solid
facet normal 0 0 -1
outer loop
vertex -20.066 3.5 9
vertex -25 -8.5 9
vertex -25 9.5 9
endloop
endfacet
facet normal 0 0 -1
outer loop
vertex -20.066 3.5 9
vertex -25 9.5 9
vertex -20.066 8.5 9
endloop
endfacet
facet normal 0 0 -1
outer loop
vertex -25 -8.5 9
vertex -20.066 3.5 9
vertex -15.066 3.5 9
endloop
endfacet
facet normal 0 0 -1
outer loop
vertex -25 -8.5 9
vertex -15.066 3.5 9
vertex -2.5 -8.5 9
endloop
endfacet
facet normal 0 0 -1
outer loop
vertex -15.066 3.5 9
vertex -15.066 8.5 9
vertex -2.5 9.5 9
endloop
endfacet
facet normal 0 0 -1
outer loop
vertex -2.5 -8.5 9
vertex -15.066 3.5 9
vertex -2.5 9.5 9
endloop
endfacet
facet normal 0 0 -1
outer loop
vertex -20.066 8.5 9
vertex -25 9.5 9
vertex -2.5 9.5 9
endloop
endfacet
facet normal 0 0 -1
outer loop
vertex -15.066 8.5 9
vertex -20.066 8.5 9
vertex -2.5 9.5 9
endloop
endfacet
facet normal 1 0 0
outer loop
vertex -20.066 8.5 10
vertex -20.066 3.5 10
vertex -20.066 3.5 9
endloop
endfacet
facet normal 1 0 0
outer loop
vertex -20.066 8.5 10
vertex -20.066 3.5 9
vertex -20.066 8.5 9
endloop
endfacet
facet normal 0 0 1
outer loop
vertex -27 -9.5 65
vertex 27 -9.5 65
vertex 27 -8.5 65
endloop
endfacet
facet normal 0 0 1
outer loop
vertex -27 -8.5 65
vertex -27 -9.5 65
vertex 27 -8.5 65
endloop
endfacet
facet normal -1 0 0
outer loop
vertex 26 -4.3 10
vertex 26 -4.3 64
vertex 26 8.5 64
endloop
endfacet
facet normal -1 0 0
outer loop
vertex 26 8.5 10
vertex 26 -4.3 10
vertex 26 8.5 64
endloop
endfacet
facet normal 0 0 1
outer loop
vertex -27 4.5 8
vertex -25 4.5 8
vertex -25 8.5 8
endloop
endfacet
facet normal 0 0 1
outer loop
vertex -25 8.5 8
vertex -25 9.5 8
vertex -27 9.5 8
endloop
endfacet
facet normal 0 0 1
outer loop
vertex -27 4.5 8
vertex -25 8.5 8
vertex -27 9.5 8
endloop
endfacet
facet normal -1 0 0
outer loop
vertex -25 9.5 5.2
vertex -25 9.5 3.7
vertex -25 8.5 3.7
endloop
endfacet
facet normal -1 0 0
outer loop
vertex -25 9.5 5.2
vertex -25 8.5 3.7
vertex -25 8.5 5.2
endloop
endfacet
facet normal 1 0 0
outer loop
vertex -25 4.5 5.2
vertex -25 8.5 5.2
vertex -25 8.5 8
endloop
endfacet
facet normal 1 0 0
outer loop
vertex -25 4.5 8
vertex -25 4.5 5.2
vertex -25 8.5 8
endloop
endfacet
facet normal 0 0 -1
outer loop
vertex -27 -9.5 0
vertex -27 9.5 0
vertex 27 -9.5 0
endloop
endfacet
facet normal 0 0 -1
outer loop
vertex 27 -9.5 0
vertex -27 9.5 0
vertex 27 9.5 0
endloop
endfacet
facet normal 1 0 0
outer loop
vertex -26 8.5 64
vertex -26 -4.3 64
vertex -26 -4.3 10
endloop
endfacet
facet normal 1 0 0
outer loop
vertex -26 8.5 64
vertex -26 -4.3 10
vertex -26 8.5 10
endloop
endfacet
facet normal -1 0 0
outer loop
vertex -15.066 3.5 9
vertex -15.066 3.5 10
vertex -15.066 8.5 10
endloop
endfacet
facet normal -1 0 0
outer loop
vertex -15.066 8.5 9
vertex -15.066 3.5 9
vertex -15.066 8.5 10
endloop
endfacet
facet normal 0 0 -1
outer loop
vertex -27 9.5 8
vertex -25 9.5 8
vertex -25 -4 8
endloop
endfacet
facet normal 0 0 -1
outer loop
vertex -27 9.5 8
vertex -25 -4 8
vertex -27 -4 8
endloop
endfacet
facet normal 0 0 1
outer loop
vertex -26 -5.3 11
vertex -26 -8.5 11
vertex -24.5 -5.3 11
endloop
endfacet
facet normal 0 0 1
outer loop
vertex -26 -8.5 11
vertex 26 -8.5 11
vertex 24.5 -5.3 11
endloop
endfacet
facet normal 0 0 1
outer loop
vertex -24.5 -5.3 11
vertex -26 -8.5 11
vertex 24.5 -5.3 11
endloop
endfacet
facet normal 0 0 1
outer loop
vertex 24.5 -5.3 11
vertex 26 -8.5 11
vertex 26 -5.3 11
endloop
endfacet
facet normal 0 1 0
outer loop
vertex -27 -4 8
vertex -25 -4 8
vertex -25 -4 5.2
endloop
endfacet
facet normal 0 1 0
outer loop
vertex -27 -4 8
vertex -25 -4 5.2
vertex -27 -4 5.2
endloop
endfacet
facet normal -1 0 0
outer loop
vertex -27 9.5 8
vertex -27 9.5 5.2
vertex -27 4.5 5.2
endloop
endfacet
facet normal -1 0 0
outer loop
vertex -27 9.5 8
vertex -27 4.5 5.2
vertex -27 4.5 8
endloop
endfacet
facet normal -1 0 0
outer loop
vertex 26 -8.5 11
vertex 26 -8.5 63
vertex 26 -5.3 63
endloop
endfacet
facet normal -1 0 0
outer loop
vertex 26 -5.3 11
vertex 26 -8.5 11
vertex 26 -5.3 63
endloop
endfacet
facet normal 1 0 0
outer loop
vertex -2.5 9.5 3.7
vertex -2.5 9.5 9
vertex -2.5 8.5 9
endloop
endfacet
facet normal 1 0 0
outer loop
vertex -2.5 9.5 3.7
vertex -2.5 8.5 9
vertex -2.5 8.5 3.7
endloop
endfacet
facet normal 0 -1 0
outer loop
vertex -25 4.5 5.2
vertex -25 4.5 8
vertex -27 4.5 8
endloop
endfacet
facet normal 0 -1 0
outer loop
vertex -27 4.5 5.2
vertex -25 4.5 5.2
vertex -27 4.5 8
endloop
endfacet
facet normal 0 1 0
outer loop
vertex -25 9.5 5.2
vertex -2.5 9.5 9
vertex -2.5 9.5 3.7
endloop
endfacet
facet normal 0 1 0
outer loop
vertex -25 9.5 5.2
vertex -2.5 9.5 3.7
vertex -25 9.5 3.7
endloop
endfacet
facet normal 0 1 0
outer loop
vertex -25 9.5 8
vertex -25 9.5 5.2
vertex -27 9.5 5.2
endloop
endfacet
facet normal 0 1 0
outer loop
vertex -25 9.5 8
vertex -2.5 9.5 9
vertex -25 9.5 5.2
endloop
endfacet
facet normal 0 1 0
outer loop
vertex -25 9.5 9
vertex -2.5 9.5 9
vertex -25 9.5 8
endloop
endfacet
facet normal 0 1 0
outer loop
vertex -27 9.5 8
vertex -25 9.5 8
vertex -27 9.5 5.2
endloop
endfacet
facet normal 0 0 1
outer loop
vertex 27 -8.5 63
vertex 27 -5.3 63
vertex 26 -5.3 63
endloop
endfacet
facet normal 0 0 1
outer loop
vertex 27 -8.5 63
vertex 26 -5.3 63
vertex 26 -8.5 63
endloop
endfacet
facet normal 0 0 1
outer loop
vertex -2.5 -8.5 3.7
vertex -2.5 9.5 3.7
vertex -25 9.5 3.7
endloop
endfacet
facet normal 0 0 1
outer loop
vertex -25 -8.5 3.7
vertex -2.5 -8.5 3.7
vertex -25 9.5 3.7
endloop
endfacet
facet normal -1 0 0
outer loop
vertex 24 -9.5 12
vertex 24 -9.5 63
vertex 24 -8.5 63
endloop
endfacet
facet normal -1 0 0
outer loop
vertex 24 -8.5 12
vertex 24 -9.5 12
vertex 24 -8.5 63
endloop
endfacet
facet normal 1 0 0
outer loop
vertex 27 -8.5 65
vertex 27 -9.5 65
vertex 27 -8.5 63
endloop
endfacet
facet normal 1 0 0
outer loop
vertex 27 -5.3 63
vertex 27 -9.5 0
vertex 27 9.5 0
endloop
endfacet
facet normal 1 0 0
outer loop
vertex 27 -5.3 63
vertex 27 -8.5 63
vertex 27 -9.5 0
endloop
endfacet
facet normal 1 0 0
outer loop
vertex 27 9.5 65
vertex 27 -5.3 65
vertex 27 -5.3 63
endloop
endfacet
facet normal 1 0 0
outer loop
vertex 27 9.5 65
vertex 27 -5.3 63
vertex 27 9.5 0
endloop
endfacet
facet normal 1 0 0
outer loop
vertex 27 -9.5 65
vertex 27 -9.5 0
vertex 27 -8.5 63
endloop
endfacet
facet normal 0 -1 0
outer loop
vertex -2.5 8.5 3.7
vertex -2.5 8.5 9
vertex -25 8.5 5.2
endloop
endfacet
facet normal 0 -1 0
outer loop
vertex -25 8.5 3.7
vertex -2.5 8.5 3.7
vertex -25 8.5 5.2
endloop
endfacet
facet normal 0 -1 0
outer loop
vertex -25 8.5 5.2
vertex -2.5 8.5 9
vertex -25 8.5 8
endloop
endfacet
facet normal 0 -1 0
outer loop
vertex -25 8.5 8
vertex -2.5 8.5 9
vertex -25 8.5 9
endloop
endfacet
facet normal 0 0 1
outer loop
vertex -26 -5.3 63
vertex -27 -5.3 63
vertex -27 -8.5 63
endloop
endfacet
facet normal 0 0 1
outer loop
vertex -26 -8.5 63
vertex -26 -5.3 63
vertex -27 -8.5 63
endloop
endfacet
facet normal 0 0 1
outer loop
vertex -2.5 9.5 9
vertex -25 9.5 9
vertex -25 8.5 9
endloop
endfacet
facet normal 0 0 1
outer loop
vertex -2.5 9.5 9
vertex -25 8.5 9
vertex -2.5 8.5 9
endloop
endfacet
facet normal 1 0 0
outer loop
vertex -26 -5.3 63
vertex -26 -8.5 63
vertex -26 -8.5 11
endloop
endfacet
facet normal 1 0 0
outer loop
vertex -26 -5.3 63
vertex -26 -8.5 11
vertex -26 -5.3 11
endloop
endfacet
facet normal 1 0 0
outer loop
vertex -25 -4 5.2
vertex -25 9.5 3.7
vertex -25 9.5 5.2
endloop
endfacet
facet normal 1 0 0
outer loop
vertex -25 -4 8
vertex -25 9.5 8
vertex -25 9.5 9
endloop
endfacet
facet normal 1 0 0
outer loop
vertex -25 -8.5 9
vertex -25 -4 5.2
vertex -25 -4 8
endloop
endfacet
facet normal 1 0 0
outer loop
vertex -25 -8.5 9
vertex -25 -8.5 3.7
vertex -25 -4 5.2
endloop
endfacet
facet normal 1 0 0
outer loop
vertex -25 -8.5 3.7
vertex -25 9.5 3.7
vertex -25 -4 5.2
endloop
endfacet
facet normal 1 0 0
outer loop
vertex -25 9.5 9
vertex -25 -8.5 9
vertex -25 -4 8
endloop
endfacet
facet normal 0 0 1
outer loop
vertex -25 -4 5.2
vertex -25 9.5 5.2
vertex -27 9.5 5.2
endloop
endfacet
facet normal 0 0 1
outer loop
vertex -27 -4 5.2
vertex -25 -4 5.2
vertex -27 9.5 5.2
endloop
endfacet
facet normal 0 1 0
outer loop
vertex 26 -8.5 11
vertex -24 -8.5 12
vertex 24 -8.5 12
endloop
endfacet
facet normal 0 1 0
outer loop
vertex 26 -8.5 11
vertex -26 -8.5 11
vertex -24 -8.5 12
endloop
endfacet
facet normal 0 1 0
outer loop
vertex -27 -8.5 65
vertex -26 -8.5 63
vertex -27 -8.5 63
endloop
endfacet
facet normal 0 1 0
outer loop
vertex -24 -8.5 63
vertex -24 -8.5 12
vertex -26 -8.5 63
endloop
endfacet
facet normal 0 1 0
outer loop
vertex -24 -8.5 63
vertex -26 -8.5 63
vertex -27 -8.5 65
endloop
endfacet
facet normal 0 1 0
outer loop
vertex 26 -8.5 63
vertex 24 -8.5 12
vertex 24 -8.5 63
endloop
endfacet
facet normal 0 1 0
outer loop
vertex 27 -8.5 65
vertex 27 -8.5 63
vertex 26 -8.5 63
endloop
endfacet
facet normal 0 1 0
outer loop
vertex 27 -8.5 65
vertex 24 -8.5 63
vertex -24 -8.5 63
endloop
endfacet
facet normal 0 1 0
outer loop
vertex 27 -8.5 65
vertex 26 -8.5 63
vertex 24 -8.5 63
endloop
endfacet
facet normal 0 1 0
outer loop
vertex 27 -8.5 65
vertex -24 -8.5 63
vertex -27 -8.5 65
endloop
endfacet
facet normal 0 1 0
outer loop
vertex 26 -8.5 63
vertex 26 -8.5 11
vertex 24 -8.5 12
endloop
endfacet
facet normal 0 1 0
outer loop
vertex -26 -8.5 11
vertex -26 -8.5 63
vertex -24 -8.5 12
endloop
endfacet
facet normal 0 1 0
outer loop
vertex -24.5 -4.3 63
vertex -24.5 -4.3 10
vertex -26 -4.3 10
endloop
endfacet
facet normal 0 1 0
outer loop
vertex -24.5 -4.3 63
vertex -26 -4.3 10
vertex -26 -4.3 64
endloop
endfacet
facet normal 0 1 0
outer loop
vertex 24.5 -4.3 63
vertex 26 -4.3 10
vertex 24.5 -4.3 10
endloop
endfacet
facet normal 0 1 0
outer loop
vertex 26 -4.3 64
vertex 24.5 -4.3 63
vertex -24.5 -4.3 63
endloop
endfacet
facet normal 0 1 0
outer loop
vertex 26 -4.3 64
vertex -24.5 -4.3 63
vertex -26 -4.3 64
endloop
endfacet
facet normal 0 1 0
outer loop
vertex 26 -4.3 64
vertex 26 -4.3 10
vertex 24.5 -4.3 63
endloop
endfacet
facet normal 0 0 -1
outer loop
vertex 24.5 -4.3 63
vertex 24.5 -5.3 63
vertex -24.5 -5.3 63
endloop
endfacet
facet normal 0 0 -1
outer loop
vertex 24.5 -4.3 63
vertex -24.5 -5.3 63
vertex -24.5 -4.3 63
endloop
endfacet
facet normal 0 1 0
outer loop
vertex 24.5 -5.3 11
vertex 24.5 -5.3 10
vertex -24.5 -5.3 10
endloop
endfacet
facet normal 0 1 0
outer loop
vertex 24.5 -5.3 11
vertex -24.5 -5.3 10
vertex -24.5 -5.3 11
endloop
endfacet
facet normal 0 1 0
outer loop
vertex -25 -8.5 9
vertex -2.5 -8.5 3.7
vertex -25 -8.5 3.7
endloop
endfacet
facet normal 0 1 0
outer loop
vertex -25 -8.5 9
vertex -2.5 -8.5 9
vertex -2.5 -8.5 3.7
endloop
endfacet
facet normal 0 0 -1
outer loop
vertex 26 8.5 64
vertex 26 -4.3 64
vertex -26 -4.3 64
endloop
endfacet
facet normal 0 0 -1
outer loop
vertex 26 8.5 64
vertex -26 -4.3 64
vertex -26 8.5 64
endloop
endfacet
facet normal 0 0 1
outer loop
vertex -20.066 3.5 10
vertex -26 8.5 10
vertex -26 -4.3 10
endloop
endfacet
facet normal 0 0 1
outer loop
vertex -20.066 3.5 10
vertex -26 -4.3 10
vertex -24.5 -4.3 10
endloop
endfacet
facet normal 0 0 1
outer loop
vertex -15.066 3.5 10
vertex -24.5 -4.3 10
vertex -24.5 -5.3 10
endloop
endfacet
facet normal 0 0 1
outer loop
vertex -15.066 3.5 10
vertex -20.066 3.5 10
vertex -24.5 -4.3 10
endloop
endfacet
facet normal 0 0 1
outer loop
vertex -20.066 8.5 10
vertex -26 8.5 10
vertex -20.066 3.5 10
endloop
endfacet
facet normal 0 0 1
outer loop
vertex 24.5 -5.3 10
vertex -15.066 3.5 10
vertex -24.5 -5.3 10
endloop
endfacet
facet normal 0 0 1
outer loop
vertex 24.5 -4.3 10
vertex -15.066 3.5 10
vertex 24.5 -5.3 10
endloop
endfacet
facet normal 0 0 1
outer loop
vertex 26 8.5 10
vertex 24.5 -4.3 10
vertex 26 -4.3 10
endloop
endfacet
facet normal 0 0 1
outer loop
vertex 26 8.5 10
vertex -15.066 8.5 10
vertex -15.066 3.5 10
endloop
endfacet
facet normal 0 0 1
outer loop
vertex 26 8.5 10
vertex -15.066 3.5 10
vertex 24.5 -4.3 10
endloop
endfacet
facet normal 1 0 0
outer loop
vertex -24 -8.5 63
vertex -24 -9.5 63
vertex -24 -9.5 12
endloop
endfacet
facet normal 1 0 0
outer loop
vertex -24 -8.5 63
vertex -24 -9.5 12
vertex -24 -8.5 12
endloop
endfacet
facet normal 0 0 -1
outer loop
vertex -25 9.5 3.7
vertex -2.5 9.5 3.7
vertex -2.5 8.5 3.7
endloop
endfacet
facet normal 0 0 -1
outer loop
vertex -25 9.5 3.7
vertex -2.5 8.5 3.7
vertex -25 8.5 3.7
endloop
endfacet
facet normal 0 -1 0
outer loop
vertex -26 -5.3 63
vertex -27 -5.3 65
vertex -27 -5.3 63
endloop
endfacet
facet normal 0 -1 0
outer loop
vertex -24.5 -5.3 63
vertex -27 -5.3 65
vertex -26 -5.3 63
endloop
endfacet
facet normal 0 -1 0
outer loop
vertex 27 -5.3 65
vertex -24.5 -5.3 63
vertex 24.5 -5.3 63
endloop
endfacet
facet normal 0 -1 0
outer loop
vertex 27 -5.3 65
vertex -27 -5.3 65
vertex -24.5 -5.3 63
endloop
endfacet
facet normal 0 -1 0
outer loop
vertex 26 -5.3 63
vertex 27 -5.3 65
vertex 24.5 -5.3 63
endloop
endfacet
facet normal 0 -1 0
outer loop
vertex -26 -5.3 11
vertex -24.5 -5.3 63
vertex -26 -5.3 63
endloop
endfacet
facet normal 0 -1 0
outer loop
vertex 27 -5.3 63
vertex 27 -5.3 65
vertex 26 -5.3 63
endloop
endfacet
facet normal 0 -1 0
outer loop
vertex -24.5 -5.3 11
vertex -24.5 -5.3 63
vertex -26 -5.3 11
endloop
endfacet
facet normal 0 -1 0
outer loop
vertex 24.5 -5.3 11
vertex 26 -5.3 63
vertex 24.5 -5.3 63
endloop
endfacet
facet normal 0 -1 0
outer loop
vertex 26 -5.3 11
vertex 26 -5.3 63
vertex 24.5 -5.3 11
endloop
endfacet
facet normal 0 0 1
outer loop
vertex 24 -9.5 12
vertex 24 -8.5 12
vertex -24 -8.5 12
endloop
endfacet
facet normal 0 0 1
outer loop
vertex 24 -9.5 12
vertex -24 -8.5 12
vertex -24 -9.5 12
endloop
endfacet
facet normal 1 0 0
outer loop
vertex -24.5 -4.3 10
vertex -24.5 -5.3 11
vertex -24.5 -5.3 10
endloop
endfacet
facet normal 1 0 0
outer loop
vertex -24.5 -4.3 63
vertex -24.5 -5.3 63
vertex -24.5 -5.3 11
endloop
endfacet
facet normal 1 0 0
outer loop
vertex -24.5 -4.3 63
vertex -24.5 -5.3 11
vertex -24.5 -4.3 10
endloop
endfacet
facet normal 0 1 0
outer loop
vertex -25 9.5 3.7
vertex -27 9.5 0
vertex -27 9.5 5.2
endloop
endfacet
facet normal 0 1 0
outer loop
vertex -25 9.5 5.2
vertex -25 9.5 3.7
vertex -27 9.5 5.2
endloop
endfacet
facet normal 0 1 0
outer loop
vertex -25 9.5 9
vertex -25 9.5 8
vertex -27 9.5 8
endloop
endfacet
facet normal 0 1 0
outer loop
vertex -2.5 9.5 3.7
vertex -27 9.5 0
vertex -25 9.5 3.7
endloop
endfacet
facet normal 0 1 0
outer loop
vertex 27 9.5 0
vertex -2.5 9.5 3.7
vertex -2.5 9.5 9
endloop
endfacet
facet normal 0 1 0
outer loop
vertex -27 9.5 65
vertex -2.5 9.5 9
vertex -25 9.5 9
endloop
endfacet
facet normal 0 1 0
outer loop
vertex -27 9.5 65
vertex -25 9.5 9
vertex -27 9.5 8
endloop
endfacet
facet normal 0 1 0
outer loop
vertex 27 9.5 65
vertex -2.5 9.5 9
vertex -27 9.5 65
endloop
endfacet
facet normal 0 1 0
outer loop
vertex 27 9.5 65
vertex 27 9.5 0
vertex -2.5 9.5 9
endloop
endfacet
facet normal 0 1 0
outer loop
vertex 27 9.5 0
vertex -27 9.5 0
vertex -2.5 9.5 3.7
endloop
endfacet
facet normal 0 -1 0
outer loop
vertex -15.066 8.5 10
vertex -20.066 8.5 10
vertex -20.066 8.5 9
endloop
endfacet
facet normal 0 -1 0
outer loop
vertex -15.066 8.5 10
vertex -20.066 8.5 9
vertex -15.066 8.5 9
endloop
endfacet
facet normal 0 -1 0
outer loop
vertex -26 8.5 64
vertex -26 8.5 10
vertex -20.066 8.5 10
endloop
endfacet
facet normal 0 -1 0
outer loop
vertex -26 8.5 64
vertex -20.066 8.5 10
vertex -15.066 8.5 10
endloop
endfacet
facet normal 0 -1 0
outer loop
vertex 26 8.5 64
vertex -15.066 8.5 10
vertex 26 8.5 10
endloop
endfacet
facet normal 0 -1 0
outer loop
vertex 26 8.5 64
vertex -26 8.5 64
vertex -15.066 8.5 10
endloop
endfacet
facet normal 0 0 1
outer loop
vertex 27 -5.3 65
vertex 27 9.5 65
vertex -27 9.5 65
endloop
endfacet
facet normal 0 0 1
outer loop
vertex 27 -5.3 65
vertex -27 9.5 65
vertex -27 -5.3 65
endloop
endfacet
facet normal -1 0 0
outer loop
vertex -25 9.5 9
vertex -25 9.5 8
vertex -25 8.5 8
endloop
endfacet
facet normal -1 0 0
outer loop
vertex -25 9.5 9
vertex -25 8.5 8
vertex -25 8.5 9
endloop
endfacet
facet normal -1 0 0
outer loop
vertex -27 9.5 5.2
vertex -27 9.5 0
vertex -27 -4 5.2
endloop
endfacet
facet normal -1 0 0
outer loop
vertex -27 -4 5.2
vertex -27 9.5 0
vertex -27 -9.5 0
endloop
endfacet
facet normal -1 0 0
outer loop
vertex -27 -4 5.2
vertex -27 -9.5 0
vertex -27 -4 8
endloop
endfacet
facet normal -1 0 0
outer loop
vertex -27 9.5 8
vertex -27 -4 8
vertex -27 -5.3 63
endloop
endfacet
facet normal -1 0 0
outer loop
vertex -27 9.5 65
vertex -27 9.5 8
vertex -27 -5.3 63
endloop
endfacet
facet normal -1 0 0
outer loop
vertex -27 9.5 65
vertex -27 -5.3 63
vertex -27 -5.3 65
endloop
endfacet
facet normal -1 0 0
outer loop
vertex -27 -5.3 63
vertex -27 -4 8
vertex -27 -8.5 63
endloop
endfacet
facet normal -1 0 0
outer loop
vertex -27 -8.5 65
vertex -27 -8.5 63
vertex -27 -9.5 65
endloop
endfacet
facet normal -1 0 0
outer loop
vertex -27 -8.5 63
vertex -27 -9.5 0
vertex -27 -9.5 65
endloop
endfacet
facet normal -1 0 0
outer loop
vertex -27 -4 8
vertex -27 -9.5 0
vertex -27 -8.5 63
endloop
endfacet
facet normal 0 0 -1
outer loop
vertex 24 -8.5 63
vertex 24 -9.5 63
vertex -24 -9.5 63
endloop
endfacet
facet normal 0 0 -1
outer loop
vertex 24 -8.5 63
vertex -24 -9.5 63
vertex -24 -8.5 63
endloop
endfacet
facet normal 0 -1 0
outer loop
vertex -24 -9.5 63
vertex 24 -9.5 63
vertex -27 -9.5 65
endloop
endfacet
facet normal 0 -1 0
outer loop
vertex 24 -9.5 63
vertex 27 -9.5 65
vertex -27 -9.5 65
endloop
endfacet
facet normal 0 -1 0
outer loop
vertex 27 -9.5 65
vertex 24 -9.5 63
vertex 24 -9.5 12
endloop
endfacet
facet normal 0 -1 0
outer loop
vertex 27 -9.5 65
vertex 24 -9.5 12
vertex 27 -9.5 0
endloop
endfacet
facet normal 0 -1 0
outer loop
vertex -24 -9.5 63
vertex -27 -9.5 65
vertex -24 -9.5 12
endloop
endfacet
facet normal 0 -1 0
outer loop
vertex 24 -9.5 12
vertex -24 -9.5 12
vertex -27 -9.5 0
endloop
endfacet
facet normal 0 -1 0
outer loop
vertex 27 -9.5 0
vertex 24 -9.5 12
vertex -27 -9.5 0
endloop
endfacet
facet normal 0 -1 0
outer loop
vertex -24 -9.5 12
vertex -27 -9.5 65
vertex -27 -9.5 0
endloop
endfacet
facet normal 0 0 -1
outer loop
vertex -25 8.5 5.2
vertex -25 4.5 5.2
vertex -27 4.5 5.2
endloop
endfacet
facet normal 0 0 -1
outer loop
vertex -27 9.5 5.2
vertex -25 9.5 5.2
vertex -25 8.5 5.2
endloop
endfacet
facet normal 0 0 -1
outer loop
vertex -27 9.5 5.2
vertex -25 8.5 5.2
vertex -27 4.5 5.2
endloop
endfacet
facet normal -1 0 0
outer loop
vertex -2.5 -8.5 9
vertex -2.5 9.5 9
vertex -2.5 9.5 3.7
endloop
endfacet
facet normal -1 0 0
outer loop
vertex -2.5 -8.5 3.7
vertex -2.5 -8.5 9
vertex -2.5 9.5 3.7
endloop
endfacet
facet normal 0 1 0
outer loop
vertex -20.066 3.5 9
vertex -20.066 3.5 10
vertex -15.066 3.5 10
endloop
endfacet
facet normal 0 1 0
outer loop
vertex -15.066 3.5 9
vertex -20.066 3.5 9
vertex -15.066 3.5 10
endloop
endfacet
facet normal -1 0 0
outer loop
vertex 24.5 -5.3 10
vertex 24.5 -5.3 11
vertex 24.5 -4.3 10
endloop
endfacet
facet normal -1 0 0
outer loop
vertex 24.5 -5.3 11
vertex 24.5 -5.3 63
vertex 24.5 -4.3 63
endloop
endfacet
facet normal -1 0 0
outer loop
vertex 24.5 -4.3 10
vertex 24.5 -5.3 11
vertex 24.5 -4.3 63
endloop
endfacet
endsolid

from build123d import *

# Parameters (mm, degrees)
F0_W      = 54
F0_H      = 19
F1_DEPTH  = 10
F2_W      = 1
F2_H      = 51
F3_DEPTH  = 3
F2_H_2    = 1
F4_DEPTH  = 1
F2_H_3    = 54
F5_DEPTH  = 54
F2_W_2    = 3.2
F6_DEPTH  = 1
F2_H_4    = 2
F7_DEPTH  = 54
F8_DEPTH  = 2.5
F10_W     = 2
F10_H     = 2.8
F11_DEPTH = 18
F12_W     = 2
F12_H     = 2.8
F13_DEPTH = 4.5
F14_DEPTH = 1
F15_DEPTH = 5
F16_W     = 5
F16_H     = 5
F17_DEPTH = 1


# Not quite as in the source:
# - a feature names something its author has since deleted; it is built from what else it names


with BuildPart() as f1:
    # F0 (on Top) → F1 (new body)
    with BuildSketch(Plane.XY):
        Rectangle(F0_W, F0_H)
    extrude(amount=F1_DEPTH)

    # F2 (on face) → F3 (join)
    with BuildSketch(Plane.YZ.offset(27)):
        with Locations((-9, 37.5)):
            Rectangle(F2_W, F2_H)
        Polygon((-9.5, 12), (-9.5, 10), (-8.5, 10), (-8.5, 11), (-8.5, 12), align=None)
    extrude(amount=-F3_DEPTH)

    # F2 (on face) → F4 (join)
    with BuildSketch(Plane.YZ.offset(27)):
        Polygon((-5.3, 11), (-5.3, 10), (-4.3, 10), (-4.3, 63), (-5.3, 63), align=None)
        Polygon((-4.3, 63), (-4.3, 10), (8.5, 10), (8.5, 64), (-4.3, 64), align=None)
        with Locations((-4.8, 63.5)):
            Rectangle(F2_W, F2_H_2)
    extrude(amount=-F4_DEPTH)

    # F2 (on face) → F5 (join, through all)
    with BuildSketch(Plane.YZ.offset(27)):
        with Locations((9, 37)):
            Rectangle(F2_W, F2_H_3)
        Polygon((8.5, 64), (9.5, 64), (9.5, 65), (-5.3, 65), (-5.3, 64), (-4.3, 64), align=None)
    extrude(amount=-F5_DEPTH)

    # F2 (on face) → F6 (join)
    with BuildSketch(Plane.YZ.offset(27)):
        Polygon((-8.5, 12), (-8.5, 11), (-5.3, 11), (-5.3, 63), (-8.5, 63), align=None)
        with Locations((-6.9, 10.5)):
            Rectangle(F2_W_2, F2_H_2)
    extrude(amount=-F6_DEPTH)

    # F2 (on face) → F7 (join, through all)
    with BuildSketch(Plane.YZ.offset(27)):
        with Locations((-6.9, 10.5)):
            Rectangle(F2_W_2, F2_H_2)
        Polygon((-9.5, 12), (-9.5, 10), (-8.5, 10), (-8.5, 11), (-8.5, 12), align=None)
        with Locations((-4.8, 63.5)):
            Rectangle(F2_W, F2_H_2)
        with Locations((-9, 64)):
            Rectangle(F2_W, F2_H_4)
    extrude(amount=-F7_DEPTH)

    # F2 (on face) → F8 (join)
    with BuildSketch(Plane.YZ.offset(27)):
        Polygon((-5.3, 11), (-5.3, 10), (-4.3, 10), (-4.3, 63), (-5.3, 63), align=None)
    extrude(amount=-F8_DEPTH)

    # F9: F1 across plane


with BuildPart() as f1_1:
    add(f1.part)
    add(f1.part.mirror(Plane.YZ))

    # F10 (on face) → F11 (cut)
    with BuildSketch(Plane(origin=(0, 9.5, 0), x_dir=(-1, 0, 0), z_dir=(0, 1, 0))):
        with Locations((26, 6.6)):
            Rectangle(F10_W, F10_H)
        Polygon((25, 3.7), (25, 5.2), (25, 8), (25, 9), (2.5, 9), (2.5, 8), (2.5, 3.7), align=None)
    extrude(amount=-F11_DEPTH, mode=Mode.SUBTRACT)

    # F12 (on face) → F13 (join)
    with BuildSketch(Plane(origin=(0, -8.5, 0), x_dir=(-1, 0, 0), z_dir=(0, 1, 0))):
        with Locations((26, 6.6)):
            Rectangle(F12_W, F12_H)
    extrude(amount=F13_DEPTH)

    # F16 (on face) → F17 (cut, through all)
    with BuildSketch(Plane.XY.offset(10)):
        with Locations((-17.5664718822, 6)):
            Rectangle(F16_W, F16_H)
    extrude(amount=-F17_DEPTH, mode=Mode.SUBTRACT)


with BuildPart() as f14:
    # F10 (on face) → F14 (new body)
    with BuildSketch(Plane(origin=(0, 9.5, 0), x_dir=(-1, 0, 0), z_dir=(0, 1, 0))):
        Polygon((25, 3.7), (25, 5.2), (25, 8), (25, 9), (2.5, 9), (2.5, 8), (2.5, 3.7), align=None)
    extrude(amount=-F14_DEPTH)

    # F10 (on face) → F15 (join)
    with BuildSketch(Plane(origin=(0, 9.5, 0), x_dir=(-1, 0, 0), z_dir=(0, 1, 0))):
        with Locations((26, 6.6)):
            Rectangle(F10_W, F10_H)
    extrude(amount=-F15_DEPTH)


solid = Compound([f1_1.part, f14.part])
